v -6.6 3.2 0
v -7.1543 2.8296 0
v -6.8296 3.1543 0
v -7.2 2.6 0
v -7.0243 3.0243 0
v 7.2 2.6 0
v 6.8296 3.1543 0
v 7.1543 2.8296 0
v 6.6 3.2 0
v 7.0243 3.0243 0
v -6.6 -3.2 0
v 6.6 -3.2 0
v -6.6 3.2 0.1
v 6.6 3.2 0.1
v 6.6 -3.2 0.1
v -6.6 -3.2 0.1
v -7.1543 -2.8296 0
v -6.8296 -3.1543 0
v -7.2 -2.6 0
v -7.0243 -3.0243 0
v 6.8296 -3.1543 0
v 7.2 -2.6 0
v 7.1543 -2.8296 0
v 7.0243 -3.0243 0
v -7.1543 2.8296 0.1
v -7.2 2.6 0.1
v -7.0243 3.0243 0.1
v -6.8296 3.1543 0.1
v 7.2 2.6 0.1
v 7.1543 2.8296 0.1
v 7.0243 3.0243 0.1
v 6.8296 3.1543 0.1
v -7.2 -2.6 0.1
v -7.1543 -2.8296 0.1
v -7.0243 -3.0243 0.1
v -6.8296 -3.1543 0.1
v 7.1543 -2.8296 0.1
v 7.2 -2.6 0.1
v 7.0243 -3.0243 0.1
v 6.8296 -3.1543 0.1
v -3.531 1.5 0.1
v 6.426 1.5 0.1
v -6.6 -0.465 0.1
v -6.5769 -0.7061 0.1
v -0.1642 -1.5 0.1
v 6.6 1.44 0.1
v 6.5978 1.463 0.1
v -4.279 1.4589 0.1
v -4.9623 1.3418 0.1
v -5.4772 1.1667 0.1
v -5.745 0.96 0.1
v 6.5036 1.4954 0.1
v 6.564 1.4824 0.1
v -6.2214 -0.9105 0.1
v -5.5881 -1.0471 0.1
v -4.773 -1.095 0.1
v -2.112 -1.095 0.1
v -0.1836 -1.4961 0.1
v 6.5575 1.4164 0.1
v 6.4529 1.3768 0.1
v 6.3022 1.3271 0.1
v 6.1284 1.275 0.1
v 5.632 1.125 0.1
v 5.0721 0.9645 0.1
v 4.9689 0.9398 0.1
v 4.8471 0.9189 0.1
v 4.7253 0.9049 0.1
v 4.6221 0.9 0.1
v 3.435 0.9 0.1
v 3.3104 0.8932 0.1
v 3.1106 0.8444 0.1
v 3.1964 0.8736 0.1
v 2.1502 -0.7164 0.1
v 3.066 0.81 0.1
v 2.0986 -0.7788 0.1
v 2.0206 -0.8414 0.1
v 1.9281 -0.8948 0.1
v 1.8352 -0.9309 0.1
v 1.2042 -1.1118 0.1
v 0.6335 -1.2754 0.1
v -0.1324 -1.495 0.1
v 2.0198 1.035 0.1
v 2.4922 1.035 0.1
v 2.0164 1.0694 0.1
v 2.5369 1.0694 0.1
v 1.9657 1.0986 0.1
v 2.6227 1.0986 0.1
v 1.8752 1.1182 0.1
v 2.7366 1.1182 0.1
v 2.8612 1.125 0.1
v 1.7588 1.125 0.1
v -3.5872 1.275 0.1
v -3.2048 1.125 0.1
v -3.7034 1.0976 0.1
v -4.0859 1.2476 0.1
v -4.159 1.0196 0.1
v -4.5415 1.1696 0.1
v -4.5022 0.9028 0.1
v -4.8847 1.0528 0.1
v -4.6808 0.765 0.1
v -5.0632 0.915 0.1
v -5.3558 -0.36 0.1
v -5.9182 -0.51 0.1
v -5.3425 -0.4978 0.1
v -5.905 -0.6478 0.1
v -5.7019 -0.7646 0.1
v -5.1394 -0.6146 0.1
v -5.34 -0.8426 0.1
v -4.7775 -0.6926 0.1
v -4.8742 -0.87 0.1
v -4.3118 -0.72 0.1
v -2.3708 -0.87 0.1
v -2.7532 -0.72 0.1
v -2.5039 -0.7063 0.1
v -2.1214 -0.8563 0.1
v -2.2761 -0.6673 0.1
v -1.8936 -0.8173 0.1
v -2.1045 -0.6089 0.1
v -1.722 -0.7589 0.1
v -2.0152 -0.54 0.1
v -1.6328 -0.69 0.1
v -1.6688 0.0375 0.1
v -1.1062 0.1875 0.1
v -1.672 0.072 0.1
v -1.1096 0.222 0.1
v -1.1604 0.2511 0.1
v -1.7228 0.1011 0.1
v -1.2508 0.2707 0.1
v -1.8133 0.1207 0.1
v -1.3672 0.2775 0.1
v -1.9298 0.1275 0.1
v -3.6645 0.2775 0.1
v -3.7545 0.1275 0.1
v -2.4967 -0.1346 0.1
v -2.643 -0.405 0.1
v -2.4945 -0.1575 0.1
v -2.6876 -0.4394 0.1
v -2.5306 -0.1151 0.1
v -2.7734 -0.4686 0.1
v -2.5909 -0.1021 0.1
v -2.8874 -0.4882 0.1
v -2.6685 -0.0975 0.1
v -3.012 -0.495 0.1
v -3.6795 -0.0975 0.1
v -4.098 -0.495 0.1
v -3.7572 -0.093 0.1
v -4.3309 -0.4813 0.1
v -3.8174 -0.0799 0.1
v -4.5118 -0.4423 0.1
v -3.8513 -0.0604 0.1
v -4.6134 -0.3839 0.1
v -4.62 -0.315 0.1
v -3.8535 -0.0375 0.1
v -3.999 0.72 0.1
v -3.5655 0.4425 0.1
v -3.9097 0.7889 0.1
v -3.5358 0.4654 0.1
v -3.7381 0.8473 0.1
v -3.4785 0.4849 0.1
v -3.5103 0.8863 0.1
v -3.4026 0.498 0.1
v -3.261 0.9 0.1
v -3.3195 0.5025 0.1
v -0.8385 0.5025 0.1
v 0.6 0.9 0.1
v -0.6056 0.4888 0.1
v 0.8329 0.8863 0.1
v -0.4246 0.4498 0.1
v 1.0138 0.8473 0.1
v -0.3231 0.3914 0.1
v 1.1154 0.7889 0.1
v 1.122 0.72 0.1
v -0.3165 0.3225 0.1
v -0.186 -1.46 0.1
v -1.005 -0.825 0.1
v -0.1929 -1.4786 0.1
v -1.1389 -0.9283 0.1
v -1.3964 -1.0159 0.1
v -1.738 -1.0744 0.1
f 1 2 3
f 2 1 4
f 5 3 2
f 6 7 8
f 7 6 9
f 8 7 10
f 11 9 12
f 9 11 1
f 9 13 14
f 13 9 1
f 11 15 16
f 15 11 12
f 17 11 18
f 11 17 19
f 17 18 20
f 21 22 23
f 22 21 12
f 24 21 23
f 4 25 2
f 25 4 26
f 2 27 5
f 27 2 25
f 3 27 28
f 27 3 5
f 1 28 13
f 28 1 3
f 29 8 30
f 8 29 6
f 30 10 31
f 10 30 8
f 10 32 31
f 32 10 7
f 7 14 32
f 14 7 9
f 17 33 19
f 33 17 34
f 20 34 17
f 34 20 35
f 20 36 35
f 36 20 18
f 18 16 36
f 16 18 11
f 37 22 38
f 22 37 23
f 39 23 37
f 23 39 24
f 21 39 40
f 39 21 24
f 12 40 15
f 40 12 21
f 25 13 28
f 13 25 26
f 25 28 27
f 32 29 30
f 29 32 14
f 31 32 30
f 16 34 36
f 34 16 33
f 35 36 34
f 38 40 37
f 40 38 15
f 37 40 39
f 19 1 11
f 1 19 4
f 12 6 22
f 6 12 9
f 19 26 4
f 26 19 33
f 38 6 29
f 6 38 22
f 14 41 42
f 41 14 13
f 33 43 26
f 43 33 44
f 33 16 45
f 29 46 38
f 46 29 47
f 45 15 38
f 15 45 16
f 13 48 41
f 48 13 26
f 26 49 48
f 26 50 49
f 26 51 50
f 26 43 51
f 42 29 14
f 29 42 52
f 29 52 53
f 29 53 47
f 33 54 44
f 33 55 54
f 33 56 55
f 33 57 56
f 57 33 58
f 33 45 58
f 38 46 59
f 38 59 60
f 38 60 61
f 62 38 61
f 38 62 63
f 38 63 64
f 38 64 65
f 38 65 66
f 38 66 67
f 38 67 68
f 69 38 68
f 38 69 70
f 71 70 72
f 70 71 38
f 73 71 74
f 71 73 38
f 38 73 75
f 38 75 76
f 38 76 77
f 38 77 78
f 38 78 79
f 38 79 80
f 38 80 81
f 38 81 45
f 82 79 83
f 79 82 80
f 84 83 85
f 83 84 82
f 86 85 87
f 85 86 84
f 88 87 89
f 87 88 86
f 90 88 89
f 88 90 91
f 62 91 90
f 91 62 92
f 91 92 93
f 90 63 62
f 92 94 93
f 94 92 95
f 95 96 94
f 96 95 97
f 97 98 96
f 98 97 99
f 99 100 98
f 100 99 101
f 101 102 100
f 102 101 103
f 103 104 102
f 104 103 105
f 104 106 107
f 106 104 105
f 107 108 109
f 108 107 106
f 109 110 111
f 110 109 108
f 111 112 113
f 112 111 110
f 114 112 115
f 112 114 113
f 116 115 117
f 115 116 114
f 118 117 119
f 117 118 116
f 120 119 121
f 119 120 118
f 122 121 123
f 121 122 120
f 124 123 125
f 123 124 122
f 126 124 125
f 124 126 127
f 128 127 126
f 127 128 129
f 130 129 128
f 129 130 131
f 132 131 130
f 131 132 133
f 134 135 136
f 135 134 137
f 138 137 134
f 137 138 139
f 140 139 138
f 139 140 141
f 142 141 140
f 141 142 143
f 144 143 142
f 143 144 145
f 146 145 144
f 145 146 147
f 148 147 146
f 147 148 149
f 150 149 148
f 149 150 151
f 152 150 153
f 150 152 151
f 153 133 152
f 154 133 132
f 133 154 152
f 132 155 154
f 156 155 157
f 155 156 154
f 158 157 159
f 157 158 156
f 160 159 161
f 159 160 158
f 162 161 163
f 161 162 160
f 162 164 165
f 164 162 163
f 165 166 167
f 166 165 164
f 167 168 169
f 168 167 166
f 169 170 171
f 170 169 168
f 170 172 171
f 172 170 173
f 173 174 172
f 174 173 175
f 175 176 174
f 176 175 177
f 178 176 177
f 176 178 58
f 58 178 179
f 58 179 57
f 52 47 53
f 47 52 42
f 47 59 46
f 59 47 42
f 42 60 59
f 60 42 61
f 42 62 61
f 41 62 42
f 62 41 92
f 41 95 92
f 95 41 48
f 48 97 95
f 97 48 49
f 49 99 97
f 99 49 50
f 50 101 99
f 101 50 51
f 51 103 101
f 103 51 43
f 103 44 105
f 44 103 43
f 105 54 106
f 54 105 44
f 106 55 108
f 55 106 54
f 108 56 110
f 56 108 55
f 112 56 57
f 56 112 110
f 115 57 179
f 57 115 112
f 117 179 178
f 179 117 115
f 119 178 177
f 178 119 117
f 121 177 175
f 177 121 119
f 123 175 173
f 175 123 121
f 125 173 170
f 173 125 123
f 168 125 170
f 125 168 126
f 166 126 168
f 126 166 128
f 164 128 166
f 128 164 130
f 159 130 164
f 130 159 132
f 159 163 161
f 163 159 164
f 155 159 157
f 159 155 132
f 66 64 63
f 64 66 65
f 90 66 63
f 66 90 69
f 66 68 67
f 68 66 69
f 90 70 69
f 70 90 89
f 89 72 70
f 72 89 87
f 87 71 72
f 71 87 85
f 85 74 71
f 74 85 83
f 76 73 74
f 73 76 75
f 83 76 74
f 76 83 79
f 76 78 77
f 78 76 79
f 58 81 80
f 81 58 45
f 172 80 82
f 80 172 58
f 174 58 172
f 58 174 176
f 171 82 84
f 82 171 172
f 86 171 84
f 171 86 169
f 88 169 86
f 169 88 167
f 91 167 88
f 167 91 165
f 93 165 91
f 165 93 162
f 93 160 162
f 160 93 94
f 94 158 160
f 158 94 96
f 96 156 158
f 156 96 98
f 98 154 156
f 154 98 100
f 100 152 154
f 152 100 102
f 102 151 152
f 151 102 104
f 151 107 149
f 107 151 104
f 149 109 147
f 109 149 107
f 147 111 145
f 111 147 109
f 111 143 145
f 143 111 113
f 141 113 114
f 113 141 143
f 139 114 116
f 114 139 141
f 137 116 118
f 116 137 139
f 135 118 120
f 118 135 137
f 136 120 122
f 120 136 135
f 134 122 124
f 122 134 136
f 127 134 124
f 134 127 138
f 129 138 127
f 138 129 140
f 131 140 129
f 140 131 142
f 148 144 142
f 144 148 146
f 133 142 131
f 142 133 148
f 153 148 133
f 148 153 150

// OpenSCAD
// file: ../p/box3u12.scad
use <../lib.scad>
function ldraw_lib__box3u12() = [
// 0 Box with 3 Parallel Faces without Any Edges
// 0 Name: box3u12.dat
// 0 Author: J.C. Tchang [tchang]
// 0 !LDRAW_ORG Primitive UPDATE 2014-02
// 0 !LICENSE Licensed under CC BY 4.0 : see CAreadme.txt
// 
// 0 BFC CERTIFY CCW
  [0,"BFC","CERTIFY"],
  [0,"BFC","CCW"],
// 
// 0 !HISTORY 2014-12-23 [PTadmin] Official Update 2014-02
// 
// 
// 4 16 -1 1 1 1 1 1 1 1 -1 -1 1 -1
  [4,16,-1,1,1,1,1,1,1,1,-1,-1,1,-1],
// 4 16 -1 1 1 -1 0 1 1 0 1 1 1 1
  [4,16,-1,1,1,-1,0,1,1,0,1,1,1,1],
// 4 16 1 1 -1 1 0 -1 -1 0 -1 -1 1 -1
  [4,16,1,1,-1,1,0,-1,-1,0,-1,-1,1,-1],
];
module ldraw_lib__box3u12(step=0, col=false, unit=2/5, alt=false, line=0.2, solid=!$preview)
    makepoly(ldraw_lib__box3u12(), step=step, col=col, unit=unit, alt=alt, line=line, solid=solid);
ldraw_lib__box3u12(line=0.2);
// file: ../p/1-4cyli.scad
use <../lib.scad>
function ldraw_lib__1_4cyli() = [
// 0 Cylinder 0.25
// 0 Name: 1-4cyli.dat
// 0 Author: James Jessiman
// 0 !LDRAW_ORG Primitive UPDATE 2012-01
// 0 !LICENSE Licensed under CC BY 4.0 : see CAreadme.txt
// 
// 0 BFC CERTIFY CCW
  [0,"BFC","CERTIFY"],
  [0,"BFC","CCW"],
// 
// 0 !HISTORY 2002-03-23 [sbliss] Added BFC statement.
// 0 !HISTORY 2002-04-25 [PTadmin] Official Update 2002-02
// 0 !HISTORY 2007-06-22 [PTadmin] Header formatted for Contributor Agreement
// 0 !HISTORY 2008-07-01 [PTadmin] Official Update 2008-01
// 0 !HISTORY 2012-02-16 [Philo] Changed to CCW
// 0 !HISTORY 2012-03-30 [PTadmin] Official Update 2012-01
// 
// 
// 4 16 1 1 0 0.9239 1 0.3827 0.9239 0 0.3827 1 0 0
  [4,16,1,1,0,0.9239,1,0.3827,0.9239,0,0.3827,1,0,0],
// 5 24 1 0 0 1 1 0 0.9239 0 0.3827 1 0 -1
  [5,24,1,0,0,1,1,0,0.9239,0,0.3827,1,0,-1],
// 4 16 0.9239 1 0.3827 0.7071 1 0.7071 0.7071 0 0.7071 0.9239 0 0.3827
  [4,16,0.9239,1,0.3827,0.7071,1,0.7071,0.7071,0,0.7071,0.9239,0,0.3827],
// 5 24 0.9239 0 0.3827 0.9239 1 0.3827 0.7071 0 0.7071 1 0 0
  [5,24,0.9239,0,0.3827,0.9239,1,0.3827,0.7071,0,0.7071,1,0,0],
// 4 16 0.7071 1 0.7071 0.3827 1 0.9239 0.3827 0 0.9239 0.7071 0 0.7071
  [4,16,0.7071,1,0.7071,0.3827,1,0.9239,0.3827,0,0.9239,0.7071,0,0.7071],
// 5 24 0.7071 0 0.7071 0.7071 1 0.7071 0.3827 0 0.9239 0.9239 0 0.3827
  [5,24,0.7071,0,0.7071,0.7071,1,0.7071,0.3827,0,0.9239,0.9239,0,0.3827],
// 4 16 0.3827 1 0.9239 0 1 1 0 0 1 0.3827 0 0.9239
  [4,16,0.3827,1,0.9239,0,1,1,0,0,1,0.3827,0,0.9239],
// 5 24 0.3827 0 0.9239 0.3827 1 0.9239 0 0 1 0.7071 0 0.7071
  [5,24,0.3827,0,0.9239,0.3827,1,0.9239,0,0,1,0.7071,0,0.7071],
// 5 24 0 0 1 0 1 1 0.3827 0 0.9239 -1 0 1
  [5,24,0,0,1,0,1,1,0.3827,0,0.9239,-1,0,1],
];
module ldraw_lib__1_4cyli(step=0, col=false, unit=2/5, alt=false, line=0.2, solid=!$preview)
    makepoly(ldraw_lib__1_4cyli(), step=step, col=col, unit=unit, alt=alt, line=line, solid=solid);
ldraw_lib__1_4cyli(line=0.2);
// file: ../p/1-4chrd.scad
use <../lib.scad>
function ldraw_lib__1_4chrd() = [
// 0 Chord 0.25
// 0 Name: 1-4chrd.dat
// 0 Author: Max Martin Richter [MMR1988]
// 0 !LDRAW_ORG Primitive UPDATE 2023-05
// 0 !LICENSE Licensed under CC BY 4.0 : see CAreadme.txt
// 
// 0 BFC CERTIFY CCW
  [0,"BFC","CERTIFY"],
  [0,"BFC","CCW"],
// 
// 0 !HISTORY 2004-04-22 [PTadmin] Official Update 2004-02
// 0 !HISTORY 2007-10-09 [PTadmin] Header formatted for Contributor Agreement
// 0 !HISTORY 2008-07-01 [PTadmin] Official Update 2008-01
// 0 !HISTORY 2012-08-02 [MMR1988] Re-creation with PrimGen2 and Rectifier
// 0 !HISTORY 2012-08-09 [PTadmin] Official Update 2012-02
// 0 !HISTORY 2023-10-27 [OrionP] Change author to MMR1988 from hafhead
// 0 !HISTORY 2023-10-31 [OrionP] Official Update 2023-05
// 
// 4 16 0.9239 0 0.3827 0.3827 0 0.9239 0 0 1 1 0 0
  [4,16,0.9239,0,0.3827,0.3827,0,0.9239,0,0,1,1,0,0],
// 3 16 0.7071 0 0.7071 0.3827 0 0.9239 0.9239 0 0.3827
  [3,16,0.7071,0,0.7071,0.3827,0,0.9239,0.9239,0,0.3827],
];
module ldraw_lib__1_4chrd(step=0, col=false, unit=2/5, alt=false, line=0.2, solid=!$preview)
    makepoly(ldraw_lib__1_4chrd(), step=step, col=col, unit=unit, alt=alt, line=line, solid=solid);
ldraw_lib__1_4chrd(line=0.2);
// main file
use <../lib.scad>
use <../p/1-4chrd.scad>
use <../p/1-4cyli.scad>
use <../p/box3u12.scad>
function ldraw_lib__6177969s() = [
// 0 Sticker  0.8 x  1.8 with White GT Logo on Red Background
// 0 Name: 6177969s.dat
// 0 Author: Massimo Maso [Sirio]
// 0 !LDRAW_ORG Part UPDATE 2024-01
// 0 !LICENSE Licensed under CC BY 4.0 : see CAreadme.txt
// 
// 0 BFC CERTIFY CCW
  [0,"BFC","CERTIFY"],
  [0,"BFC","CCW"],
// 
// 0 !KEYWORDS 2016, Bricklink 75881stk01, Brickowl 507382, Ford, GT
// 0 !KEYWORDS Rebrickable 30897, Set 75881, Speed Champions
// 
// 0 !HISTORY 2024-01-29 [OrionP] Official Update 2024-01
// 
// 
// 0 // Primitives
// 1 16 -16.5 0 6.5 -1.5 0 0 0 -1 0 0 0 1.5 1-4chrd.dat
  [1,16,-16.5,0,6.5,-1.5,0,0,0,-1,0,0,0,1.5, ldraw_lib__1_4chrd()],
// 1 16 16.5 0 6.5 1.5 0 0 0 -1 0 0 0 1.5 1-4chrd.dat
  [1,16,16.5,0,6.5,1.5,0,0,0,-1,0,0,0,1.5, ldraw_lib__1_4chrd()],
// 1 16 0 -.25 0 16.5 0 0 0 .25 0 0 0 8 box3u12.dat
  [1,16,0,-.25,0,16.5,0,0,0,.25,0,0,0,8, ldraw_lib__box3u12()],
// 1 16 -16.5 0 -6.5 -1.5 0 0 0 -1 0 0 0 -1.5 1-4chrd.dat
  [1,16,-16.5,0,-6.5,-1.5,0,0,0,-1,0,0,0,-1.5, ldraw_lib__1_4chrd()],
// 1 16 16.5 0 -6.5 1.5 0 0 0 -1 0 0 0 -1.5 1-4chrd.dat
  [1,16,16.5,0,-6.5,1.5,0,0,0,-1,0,0,0,-1.5, ldraw_lib__1_4chrd()],
// 1 16 -16.5 0 6.5 -1.5 0 0 0 -.25 0 0 0 1.5 1-4cyli.dat
  [1,16,-16.5,0,6.5,-1.5,0,0,0,-.25,0,0,0,1.5, ldraw_lib__1_4cyli()],
// 1 16 16.5 0 6.5 1.5 0 0 0 -.25 0 0 0 1.5 1-4cyli.dat
  [1,16,16.5,0,6.5,1.5,0,0,0,-.25,0,0,0,1.5, ldraw_lib__1_4cyli()],
// 1 16 -16.5 0 -6.5 -1.5 0 0 0 -.25 0 0 0 -1.5 1-4cyli.dat
  [1,16,-16.5,0,-6.5,-1.5,0,0,0,-.25,0,0,0,-1.5, ldraw_lib__1_4cyli()],
// 1 16 16.5 0 -6.5 1.5 0 0 0 -.25 0 0 0 -1.5 1-4cyli.dat
  [1,16,16.5,0,-6.5,1.5,0,0,0,-.25,0,0,0,-1.5, ldraw_lib__1_4cyli()],
// 1 4 -16.5 -.25 6.5 -1.5 0 0 0 1 0 0 0 1.5 1-4chrd.dat
  [1,4,-16.5,-.25,6.5,-1.5,0,0,0,1,0,0,0,1.5, ldraw_lib__1_4chrd()],
// 1 4 16.5 -.25 6.5 1.5 0 0 0 1 0 0 0 1.5 1-4chrd.dat
  [1,4,16.5,-.25,6.5,1.5,0,0,0,1,0,0,0,1.5, ldraw_lib__1_4chrd()],
// 1 4 -16.5 -.25 -6.5 -1.5 0 0 0 1 0 0 0 -1.5 1-4chrd.dat
  [1,4,-16.5,-.25,-6.5,-1.5,0,0,0,1,0,0,0,-1.5, ldraw_lib__1_4chrd()],
// 1 4 16.5 -.25 -6.5 1.5 0 0 0 1 0 0 0 -1.5 1-4chrd.dat
  [1,4,16.5,-.25,-6.5,1.5,0,0,0,1,0,0,0,-1.5, ldraw_lib__1_4chrd()],
// 0 // Bottom face
// 4 16 -16.5 0 8 -16.5 0 -8 -18 0 -6.5 -18 0 6.5
  [4,16,-16.5,0,8,-16.5,0,-8,-18,0,-6.5,-18,0,6.5],
// 4 16 16.5 0 8 18 0 6.5 18 0 -6.5 16.5 0 -8
  [4,16,16.5,0,8,18,0,6.5,18,0,-6.5,16.5,0,-8],
// 0 // Lateral face
// 4 16 -18 0 6.5 -18 0 -6.5 -18 -.25 -6.5 -18 -.25 6.5
  [4,16,-18,0,6.5,-18,0,-6.5,-18,-.25,-6.5,-18,-.25,6.5],
// 4 16 18 0 6.5 18 -.25 6.5 18 -.25 -6.5 18 0 -6.5
  [4,16,18,0,6.5,18,-.25,6.5,18,-.25,-6.5,18,0,-6.5],
// 0 // Top face
// 0 // Red faces
// 4 4 -16.5 -.25 8 -8.8275 -.25 3.75 16.065 -.25 3.75 16.5 -.25 8
  [4,4,-16.5,-.25,8,-8.8275,-.25,3.75,16.065,-.25,3.75,16.5,-.25,8],
// 4 4 -16.4422 -.25 -1.7653 -16.5 -.25 -1.1625 -18 -.25 6.5 -18 -.25 -6.5
  [4,4,-16.4422,-.25,-1.7653,-16.5,-.25,-1.1625,-18,-.25,6.5,-18,-.25,-6.5],
// 3 4 -18 -.25 -6.5 -16.5 -.25 -8 -.41055 -.25 -3.75
  [3,4,-18,-.25,-6.5,-16.5,-.25,-8,-.41055,-.25,-3.75],
// 4 4 16.4945 -.25 3.6574 16.5 -.25 3.6 18 -.25 -6.5 18 -.25 6.5
  [4,4,16.4945,-.25,3.6574,16.5,-.25,3.6,18,-.25,-6.5,18,-.25,6.5],
// 4 4 16.5 -.25 -8 18 -.25 -6.5 -.41055 -.25 -3.75 -16.5 -.25 -8
  [4,4,16.5,-.25,-8,18,-.25,-6.5,-.41055,-.25,-3.75,-16.5,-.25,-8],
// 4 4 -16.5 -.25 8 -18 -.25 6.5 -10.6974 -.25 3.6473 -8.8275 -.25 3.75
  [4,4,-16.5,-.25,8,-18,-.25,6.5,-10.6974,-.25,3.6473,-8.8275,-.25,3.75],
// 3 4 -18 -.25 6.5 -12.4058 -.25 3.3546 -10.6974 -.25 3.6473
  [3,4,-18,-.25,6.5,-12.4058,-.25,3.3546,-10.6974,-.25,3.6473],
// 3 4 -18 -.25 6.5 -13.693 -.25 2.9167 -12.4058 -.25 3.3546
  [3,4,-18,-.25,6.5,-13.693,-.25,2.9167,-12.4058,-.25,3.3546],
// 3 4 -18 -.25 6.5 -14.3625 -.25 2.4 -13.693 -.25 2.9167
  [3,4,-18,-.25,6.5,-14.3625,-.25,2.4,-13.693,-.25,2.9167],
// 3 4 -18 -.25 6.5 -16.5 -.25 -1.1625 -14.3625 -.25 2.4
  [3,4,-18,-.25,6.5,-16.5,-.25,-1.1625,-14.3625,-.25,2.4],
// 4 4 16.5 -.25 8 16.065 -.25 3.75 16.2591 -.25 3.7386 18 -.25 6.5
  [4,4,16.5,-.25,8,16.065,-.25,3.75,16.2591,-.25,3.7386,18,-.25,6.5],
// 3 4 18 -.25 6.5 16.2591 -.25 3.7386 16.4099 -.25 3.7061
  [3,4,18,-.25,6.5,16.2591,-.25,3.7386,16.4099,-.25,3.7061],
// 3 4 18 -.25 6.5 16.4099 -.25 3.7061 16.4945 -.25 3.6574
  [3,4,18,-.25,6.5,16.4099,-.25,3.7061,16.4945,-.25,3.6574],
// 3 4 -18 -.25 -6.5 -15.5536 -.25 -2.2762 -16.4422 -.25 -1.7653
  [3,4,-18,-.25,-6.5,-15.5536,-.25,-2.2762,-16.4422,-.25,-1.7653],
// 3 4 -18 -.25 -6.5 -13.9703 -.25 -2.6177 -15.5536 -.25 -2.2762
  [3,4,-18,-.25,-6.5,-13.9703,-.25,-2.6177,-15.5536,-.25,-2.2762],
// 3 4 -18 -.25 -6.5 -11.9325 -.25 -2.7375 -13.9703 -.25 -2.6177
  [3,4,-18,-.25,-6.5,-11.9325,-.25,-2.7375,-13.9703,-.25,-2.6177],
// 4 4 -18 -.25 -6.5 -.4591 -.25 -3.7403 -5.28 -.25 -2.7375 -11.9325 -.25 -2.7375
  [4,4,-18,-.25,-6.5,-.4591,-.25,-3.7403,-5.28,-.25,-2.7375,-11.9325,-.25,-2.7375],
// 3 4 -18 -.25 -6.5 -.4106 -.25 -3.75 -.4591 -.25 -3.7403
  [3,4,-18,-.25,-6.5,-.4106,-.25,-3.75,-.4591,-.25,-3.7403],
// 3 4 18 -.25 -6.5 16.5 -.25 3.6 16.3937 -.25 3.5411
  [3,4,18,-.25,-6.5,16.5,-.25,3.6,16.3937,-.25,3.5411],
// 3 4 18 -.25 -6.5 16.3937 -.25 3.5411 16.1323 -.25 3.4419
  [3,4,18,-.25,-6.5,16.3937,-.25,3.5411,16.1323,-.25,3.4419],
// 3 4 18 -.25 -6.5 16.1323 -.25 3.4419 15.7556 -.25 3.3178
  [3,4,18,-.25,-6.5,16.1323,-.25,3.4419,15.7556,-.25,3.3178],
// 4 4 14.08 -.25 2.8125 18 -.25 -6.5 15.7556 -.25 3.3178 15.321 -.25 3.1875
  [4,4,14.08,-.25,2.8125,18,-.25,-6.5,15.7556,-.25,3.3178,15.321,-.25,3.1875],
// 3 4 18 -.25 -6.5 14.08 -.25 2.8125 12.6803 -.25 2.4113
  [3,4,18,-.25,-6.5,14.08,-.25,2.8125,12.6803,-.25,2.4113],
// 3 4 18 -.25 -6.5 12.6803 -.25 2.4113 12.4222 -.25 2.3495
  [3,4,18,-.25,-6.5,12.6803,-.25,2.4113,12.4222,-.25,2.3495],
// 3 4 18 -.25 -6.5 12.4222 -.25 2.3495 12.1178 -.25 2.2973
  [3,4,18,-.25,-6.5,12.4222,-.25,2.3495,12.1178,-.25,2.2973],
// 3 4 18 -.25 -6.5 12.1178 -.25 2.2973 11.8133 -.25 2.2623
  [3,4,18,-.25,-6.5,12.1178,-.25,2.2973,11.8133,-.25,2.2623],
// 3 4 18 -.25 -6.5 11.8133 -.25 2.2623 11.5553 -.25 2.25
  [3,4,18,-.25,-6.5,11.8133,-.25,2.2623,11.5553,-.25,2.25],
// 4 4 18 -.25 -6.5 11.5553 -.25 2.25 8.5875 -.25 2.25 8.2759 -.25 2.2329
  [4,4,18,-.25,-6.5,11.5553,-.25,2.25,8.5875,-.25,2.25,8.2759,-.25,2.2329],
// 4 4 18 -.25 -6.5 8.2759 -.25 2.2329 7.9911 -.25 2.1841 7.7766 -.25 2.1111
  [4,4,18,-.25,-6.5,8.2759,-.25,2.2329,7.9911,-.25,2.1841,7.7766,-.25,2.1111],
// 4 4 18 -.25 -6.5 7.7766 -.25 2.1111 7.665 -.25 2.025 5.3754 -.25 -1.7911
  [4,4,18,-.25,-6.5,7.7766,-.25,2.1111,7.665,-.25,2.025,5.3754,-.25,-1.7911],
// 3 4 18 -.25 -6.5 5.3754 -.25 -1.7911 5.2465 -.25 -1.9469
  [3,4,18,-.25,-6.5,5.3754,-.25,-1.7911,5.2465,-.25,-1.9469],
// 3 4 18 -.25 -6.5 5.2465 -.25 -1.9469 5.0516 -.25 -2.1035
  [3,4,18,-.25,-6.5,5.2465,-.25,-1.9469,5.0516,-.25,-2.1035],
// 3 4 18 -.25 -6.5 5.0516 -.25 -2.1035 4.8203 -.25 -2.2371
  [3,4,18,-.25,-6.5,5.0516,-.25,-2.1035,4.8203,-.25,-2.2371],
// 3 4 18 -.25 -6.5 4.8203 -.25 -2.2371 4.5879 -.25 -2.3273
  [3,4,18,-.25,-6.5,4.8203,-.25,-2.2371,4.5879,-.25,-2.3273],
// 3 4 18 -.25 -6.5 4.5879 -.25 -2.3273 3.0104 -.25 -2.7795
  [3,4,18,-.25,-6.5,4.5879,-.25,-2.3273,3.0104,-.25,-2.7795],
// 3 4 18 -.25 -6.5 3.0104 -.25 -2.7795 1.5838 -.25 -3.1885
  [3,4,18,-.25,-6.5,3.0104,-.25,-2.7795,1.5838,-.25,-3.1885],
// 3 4 18 -.25 -6.5 1.5838 -.25 -3.1885 -.3311 -.25 -3.7374
  [3,4,18,-.25,-6.5,1.5838,-.25,-3.1885,-.3311,-.25,-3.7374],
// 3 4 18 -.25 -6.5 -.3311 -.25 -3.7374 -.4106 -.25 -3.75
  [3,4,18,-.25,-6.5,-.3311,-.25,-3.7374,-.4106,-.25,-3.75],
// 4 4 5.0494 -.25 2.5875 1.5838 -.25 -3.1885 3.0104 -.25 -2.7795 6.2306 -.25 2.5875
  [4,4,5.0494,-.25,2.5875,1.5838,-.25,-3.1885,3.0104,-.25,-2.7795,6.2306,-.25,2.5875],
// 4 4 5.0494 -.25 2.5875 6.2306 -.25 2.5875 6.3422 -.25 2.6736 5.0411 -.25 2.6736
  [4,4,5.0494,-.25,2.5875,6.2306,-.25,2.5875,6.3422,-.25,2.6736,5.0411,-.25,2.6736],
// 4 4 4.9142 -.25 2.7466 5.0411 -.25 2.6736 6.3422 -.25 2.6736 6.5567 -.25 2.7466
  [4,4,4.9142,-.25,2.7466,5.0411,-.25,2.6736,6.3422,-.25,2.6736,6.5567,-.25,2.7466],
// 4 4 4.9142 -.25 2.7466 6.5567 -.25 2.7466 6.8415 -.25 2.7954 4.688 -.25 2.7954
  [4,4,4.9142,-.25,2.7466,6.5567,-.25,2.7466,6.8415,-.25,2.7954,4.688,-.25,2.7954],
// 4 4 4.3969 -.25 2.8125 4.688 -.25 2.7954 6.8415 -.25 2.7954 7.1531 -.25 2.8125
  [4,4,4.3969,-.25,2.8125,4.688,-.25,2.7954,6.8415,-.25,2.7954,7.1531,-.25,2.8125],
// 4 4 4.3969 -.25 2.8125 7.1531 -.25 2.8125 15.321 -.25 3.1875 -8.9681 -.25 3.1875
  [4,4,4.3969,-.25,2.8125,7.1531,-.25,2.8125,15.321,-.25,3.1875,-8.9681,-.25,3.1875],
// 3 4 4.3969 -.25 2.8125 -8.9681 -.25 3.1875 -8.0119 -.25 2.8125
  [3,4,4.3969,-.25,2.8125,-8.9681,-.25,3.1875,-8.0119,-.25,2.8125],
// 3 4 7.1531 -.25 2.8125 14.08 -.25 2.8125 15.321 -.25 3.1875
  [3,4,7.1531,-.25,2.8125,14.08,-.25,2.8125,15.321,-.25,3.1875],
// 4 4 -9.2585 -.25 2.744 -8.0119 -.25 2.8125 -8.9681 -.25 3.1875 -10.2147 -.25 3.119
  [4,4,-9.2585,-.25,2.744,-8.0119,-.25,2.8125,-8.9681,-.25,3.1875,-10.2147,-.25,3.119],
// 4 4 -9.2585 -.25 2.744 -10.2147 -.25 3.119 -11.3537 -.25 2.9239 -10.3974 -.25 2.5489
  [4,4,-9.2585,-.25,2.744,-10.2147,-.25,3.119,-11.3537,-.25,2.9239,-10.3974,-.25,2.5489],
// 4 4 -11.2555 -.25 2.2569 -10.3974 -.25 2.5489 -11.3537 -.25 2.9239 -12.2117 -.25 2.6319
  [4,4,-11.2555,-.25,2.2569,-10.3974,-.25,2.5489,-11.3537,-.25,2.9239,-12.2117,-.25,2.6319],
// 4 4 -11.2555 -.25 2.2569 -12.2117 -.25 2.6319 -12.6581 -.25 2.2875 -11.7019 -.25 1.9125
  [4,4,-11.2555,-.25,2.2569,-12.2117,-.25,2.6319,-12.6581,-.25,2.2875,-11.7019,-.25,1.9125],
// 4 4 -13.3894 -.25 -.9 -11.7019 -.25 1.9125 -12.6581 -.25 2.2875 -14.7956 -.25 -1.275
  [4,4,-13.3894,-.25,-.9,-11.7019,-.25,1.9125,-12.6581,-.25,2.2875,-14.7956,-.25,-1.275],
// 4 4 -13.3894 -.25 -.9 -14.7956 -.25 -1.275 -14.7626 -.25 -1.6194 -13.3563 -.25 -1.2444
  [4,4,-13.3894,-.25,-.9,-14.7956,-.25,-1.275,-14.7626,-.25,-1.6194,-13.3563,-.25,-1.2444],
// 4 4 -12.8486 -.25 -1.5364 -13.3563 -.25 -1.2444 -14.7626 -.25 -1.6194 -14.2548 -.25 -1.9114
  [4,4,-12.8486,-.25,-1.5364,-13.3563,-.25,-1.2444,-14.7626,-.25,-1.6194,-14.2548,-.25,-1.9114],
// 4 4 -12.8486 -.25 -1.5364 -14.2548 -.25 -1.9114 -13.35 -.25 -2.1065 -11.9438 -.25 -1.7315
  [4,4,-12.8486,-.25,-1.5364,-14.2548,-.25,-1.9114,-13.35,-.25,-2.1065,-11.9438,-.25,-1.7315],
// 4 4 -10.7794 -.25 -1.8 -11.9438 -.25 -1.7315 -13.35 -.25 -2.1065 -12.1856 -.25 -2.175
  [4,4,-10.7794,-.25,-1.8,-11.9438,-.25,-1.7315,-13.35,-.25,-2.1065,-12.1856,-.25,-2.175],
// 4 4 -10.7794 -.25 -1.8 -12.1856 -.25 -2.175 -5.9269 -.25 -2.175 -6.8831 -.25 -1.8
  [4,4,-10.7794,-.25,-1.8,-12.1856,-.25,-2.175,-5.9269,-.25,-2.175,-6.8831,-.25,-1.8],
// 4 4 -6.2598 -.25 -1.7657 -6.8831 -.25 -1.8 -5.9269 -.25 -2.175 -5.3036 -.25 -2.1407
  [4,4,-6.2598,-.25,-1.7657,-6.8831,-.25,-1.8,-5.9269,-.25,-2.175,-5.3036,-.25,-2.1407],
// 4 4 -6.2598 -.25 -1.7657 -5.3036 -.25 -2.1407 -4.7341 -.25 -2.0432 -5.6903 -.25 -1.6682
  [4,4,-6.2598,-.25,-1.7657,-5.3036,-.25,-2.1407,-4.7341,-.25,-2.0432,-5.6903,-.25,-1.6682],
// 4 4 -5.2613 -.25 -1.5222 -5.6903 -.25 -1.6682 -4.7341 -.25 -2.0432 -4.3051 -.25 -1.8972
  [4,4,-5.2613,-.25,-1.5222,-5.6903,-.25,-1.6682,-4.7341,-.25,-2.0432,-4.3051,-.25,-1.8972],
// 4 4 -5.2613 -.25 -1.5222 -4.3051 -.25 -1.8972 -4.0819 -.25 -1.725 -5.0381 -.25 -1.35
  [4,4,-5.2613,-.25,-1.5222,-4.3051,-.25,-1.8972,-4.0819,-.25,-1.725,-5.0381,-.25,-1.35],
// 4 4 -4.1719 -.25 .0938 -5.0381 -.25 -1.35 -4.0819 -.25 -1.725 -2.7656 -.25 .4688
  [4,4,-4.1719,-.25,.0938,-5.0381,-.25,-1.35,-4.0819,-.25,-1.725,-2.7656,-.25,.4688],
// 4 4 -4.1719 -.25 .0938 -2.7656 -.25 .4688 -2.7739 -.25 .5549 -4.1801 -.25 .1799
  [4,4,-4.1719,-.25,.0938,-2.7656,-.25,.4688,-2.7739,-.25,.5549,-4.1801,-.25,.1799],
// 4 4 -4.3071 -.25 .2528 -4.1801 -.25 .1799 -2.7739 -.25 .5549 -2.9009 -.25 .6278
  [4,4,-4.3071,-.25,.2528,-4.1801,-.25,.1799,-2.7739,-.25,.5549,-2.9009,-.25,.6278],
// 4 4 -4.3071 -.25 .2528 -2.9009 -.25 .6278 -3.1271 -.25 .6767 -4.5333 -.25 .3017
  [4,4,-4.3071,-.25,.2528,-2.9009,-.25,.6278,-3.1271,-.25,.6767,-4.5333,-.25,.3017],
// 4 4 -4.8244 -.25 .3188 -4.5333 -.25 .3017 -3.1271 -.25 .6767 -3.4181 -.25 .6938
  [4,4,-4.8244,-.25,.3188,-4.5333,-.25,.3017,-3.1271,-.25,.6767,-3.4181,-.25,.6938],
// 4 4 -4.8244 -.25 .3188 -3.4181 -.25 .6938 -9.1613 -.25 .6938 -9.3863 -.25 .3188
  [4,4,-4.8244,-.25,.3188,-3.4181,-.25,.6938,-9.1613,-.25,.6938,-9.3863,-.25,.3188],
// 4 4 -6.2417 -.25 -.3364 -6.7191 -.25 -1.0986 -6.6075 -.25 -1.0125 -6.2363 -.25 -.3938
  [4,4,-6.2417,-.25,-.3364,-6.7191,-.25,-1.0986,-6.6075,-.25,-1.0125,-6.2363,-.25,-.3938],
// 4 4 -6.2417 -.25 -.3364 -6.3264 -.25 -.2877 -6.9336 -.25 -1.1716 -6.7191 -.25 -1.0986
  [4,4,-6.2417,-.25,-.3364,-6.3264,-.25,-.2877,-6.9336,-.25,-1.1716,-6.7191,-.25,-1.0986],
// 4 4 -6.4772 -.25 -.2552 -7.2184 -.25 -1.2204 -6.9336 -.25 -1.1716 -6.3264 -.25 -.2877
  [4,4,-6.4772,-.25,-.2552,-7.2184,-.25,-1.2204,-6.9336,-.25,-1.1716,-6.3264,-.25,-.2877],
// 4 4 -6.4772 -.25 -.2552 -6.6713 -.25 -.2438 -7.53 -.25 -1.2375 -7.2184 -.25 -1.2204
  [4,4,-6.4772,-.25,-.2552,-6.6713,-.25,-.2438,-7.53,-.25,-1.2375,-7.2184,-.25,-1.2204],
// 4 4 -9.1988 -.25 -.2438 -10.245 -.25 -1.2375 -7.53 -.25 -1.2375 -6.6713 -.25 -.2438
  [4,4,-9.1988,-.25,-.2438,-10.245,-.25,-1.2375,-7.53,-.25,-1.2375,-6.6713,-.25,-.2438],
// 4 4 -9.1988 -.25 -.2438 -9.3929 -.25 -.2324 -10.8272 -.25 -1.2032 -10.245 -.25 -1.2375
  [4,4,-9.1988,-.25,-.2438,-9.3929,-.25,-.2324,-10.8272,-.25,-1.2032,-10.245,-.25,-1.2375],
// 4 4 -9.5436 -.25 -.1998 -11.2796 -.25 -1.1057 -10.8272 -.25 -1.2032 -9.3929 -.25 -.2324
  [4,4,-9.5436,-.25,-.1998,-11.2796,-.25,-1.1057,-10.8272,-.25,-1.2032,-9.3929,-.25,-.2324],
// 4 4 -9.5436 -.25 -.1998 -9.6283 -.25 -.1511 -11.5335 -.25 -.9597 -11.2796 -.25 -1.1057
  [4,4,-9.5436,-.25,-.1998,-9.6283,-.25,-.1511,-11.5335,-.25,-.9597,-11.2796,-.25,-1.1057],
// 4 4 -9.6338 -.25 -.0938 -11.55 -.25 -.7875 -11.5335 -.25 -.9597 -9.6283 -.25 -.1511
  [4,4,-9.6338,-.25,-.0938,-11.55,-.25,-.7875,-11.5335,-.25,-.9597,-9.6283,-.25,-.1511],
// 3 4 -9.6338 -.25 -.0938 -9.3863 -.25 .3188 -11.55 -.25 -.7875
  [3,4,-9.6338,-.25,-.0938,-9.3863,-.25,.3188,-11.55,-.25,-.7875],
// 4 4 -9.1613 -.25 .6938 -9.9975 -.25 1.8 -11.55 -.25 -.7875 -9.3863 -.25 .3188
  [4,4,-9.1613,-.25,.6938,-9.9975,-.25,1.8,-11.55,-.25,-.7875,-9.3863,-.25,.3188],
// 3 4 -9.1613 -.25 .6938 -8.9138 -.25 1.1063 -9.9975 -.25 1.8
  [3,4,-9.1613,-.25,.6938,-8.9138,-.25,1.1063,-9.9975,-.25,1.8],
// 4 4 -8.8394 -.25 1.1636 -9.7743 -.25 1.9722 -9.9975 -.25 1.8 -8.9138 -.25 1.1063
  [4,4,-8.8394,-.25,1.1636,-9.7743,-.25,1.9722,-9.9975,-.25,1.8,-8.9138,-.25,1.1063],
// 4 4 -8.8394 -.25 1.1636 -8.6963 -.25 1.2123 -9.3453 -.25 2.1182 -9.7743 -.25 1.9722
  [4,4,-8.8394,-.25,1.1636,-8.6963,-.25,1.2123,-9.3453,-.25,2.1182,-9.7743,-.25,1.9722],
// 4 4 -8.5065 -.25 1.2449 -8.7758 -.25 2.2157 -9.3453 -.25 2.1182 -8.6963 -.25 1.2123
  [4,4,-8.5065,-.25,1.2449,-8.7758,-.25,2.2157,-9.3453,-.25,2.1182,-8.6963,-.25,1.2123],
// 4 4 -8.5065 -.25 1.2449 -8.2988 -.25 1.2563 -8.1525 -.25 2.25 -8.7758 -.25 2.2157
  [4,4,-8.5065,-.25,1.2449,-8.2988,-.25,1.2563,-8.1525,-.25,2.25,-8.7758,-.25,2.2157],
// 4 4 -2.0963 -.25 1.2563 1.5 -.25 2.25 -8.1525 -.25 2.25 -8.2988 -.25 1.2563
  [4,4,-2.0963,-.25,1.2563,1.5,-.25,2.25,-8.1525,-.25,2.25,-8.2988,-.25,1.2563],
// 4 4 -2.0963 -.25 1.2563 -1.514 -.25 1.222 2.0822 -.25 2.2157 1.5 -.25 2.25
  [4,4,-2.0963,-.25,1.2563,-1.514,-.25,1.222,2.0822,-.25,2.2157,1.5,-.25,2.25],
// 4 4 -1.0616 -.25 1.1245 2.5346 -.25 2.1182 2.0822 -.25 2.2157 -1.514 -.25 1.222
  [4,4,-1.0616,-.25,1.1245,2.5346,-.25,2.1182,2.0822,-.25,2.2157,-1.514,-.25,1.222],
// 4 4 -1.0616 -.25 1.1245 -.8078 -.25 .9785 2.7885 -.25 1.9722 2.5346 -.25 2.1182
  [4,4,-1.0616,-.25,1.1245,-.8078,-.25,.9785,2.7885,-.25,1.9722,2.5346,-.25,2.1182],
// 4 4 -.7913 -.25 .8063 2.805 -.25 1.8 2.7885 -.25 1.9722 -.8078 -.25 .9785
  [4,4,-.7913,-.25,.8063,2.805,-.25,1.8,2.7885,-.25,1.9722,-.8078,-.25,.9785],
// 4 4 -.7913 -.25 .8063 -2.5125 -.25 -2.0625 -.4651 -.25 -3.6501 2.805 -.25 1.8
  [4,4,-.7913,-.25,.8063,-2.5125,-.25,-2.0625,-.4651,-.25,-3.6501,2.805,-.25,1.8],
// 4 4 -2.8473 -.25 -2.3208 -.4823 -.25 -3.6965 -.4651 -.25 -3.6501 -2.5125 -.25 -2.0625
  [4,4,-2.8473,-.25,-2.3208,-.4823,-.25,-3.6965,-.4651,-.25,-3.6501,-2.5125,-.25,-2.0625],
// 4 4 -2.8473 -.25 -2.3208 -3.4909 -.25 -2.5398 -.4591 -.25 -3.7403 -.4823 -.25 -3.6965
  [4,4,-2.8473,-.25,-2.3208,-3.4909,-.25,-2.5398,-.4591,-.25,-3.7403,-.4823,-.25,-3.6965],
// 3 4 -.4591 -.25 -3.7403 -3.4909 -.25 -2.5398 -4.3451 -.25 -2.6861
  [3,4,-.4591,-.25,-3.7403,-3.4909,-.25,-2.5398,-4.3451,-.25,-2.6861],
// 3 4 -.4591 -.25 -3.7403 -4.3451 -.25 -2.6861 -5.28 -.25 -2.7375
  [3,4,-.4591,-.25,-3.7403,-4.3451,-.25,-2.6861,-5.28,-.25,-2.7375],
// 0 // White faces
// 4 15 16.065 -.25 3.75 16.4945 -.25 3.6574 16.4099 -.25 3.7061 16.2591 -.25 3.7386
  [4,15,16.065,-.25,3.75,16.4945,-.25,3.6574,16.4099,-.25,3.7061,16.2591,-.25,3.7386],
// 4 15 16.065 -.25 3.75 16.3937 -.25 3.5411 16.5 -.25 3.6 16.4945 -.25 3.6574
  [4,15,16.065,-.25,3.75,16.3937,-.25,3.5411,16.5,-.25,3.6,16.4945,-.25,3.6574],
// 4 15 16.065 -.25 3.75 15.7556 -.25 3.3178 16.1323 -.25 3.4419 16.3937 -.25 3.5411
  [4,15,16.065,-.25,3.75,15.7556,-.25,3.3178,16.1323,-.25,3.4419,16.3937,-.25,3.5411],
// 3 15 16.065 -.25 3.75 15.321 -.25 3.1875 15.7556 -.25 3.3178
  [3,15,16.065,-.25,3.75,15.321,-.25,3.1875,15.7556,-.25,3.3178],
// 4 15 16.065 -.25 3.75 -8.8275 -.25 3.75 -8.9681 -.25 3.1875 15.321 -.25 3.1875
  [4,15,16.065,-.25,3.75,-8.8275,-.25,3.75,-8.9681,-.25,3.1875,15.321,-.25,3.1875],
// 4 15 -10.6974 -.25 3.6473 -10.2147 -.25 3.119 -8.9681 -.25 3.1875 -8.8275 -.25 3.75
  [4,15,-10.6974,-.25,3.6473,-10.2147,-.25,3.119,-8.9681,-.25,3.1875,-8.8275,-.25,3.75],
// 4 15 -10.6974 -.25 3.6473 -12.4058 -.25 3.3546 -11.3537 -.25 2.9239 -10.2147 -.25 3.119
  [4,15,-10.6974,-.25,3.6473,-12.4058,-.25,3.3546,-11.3537,-.25,2.9239,-10.2147,-.25,3.119],
// 4 15 -13.693 -.25 2.9167 -12.2117 -.25 2.6319 -11.3537 -.25 2.9239 -12.4058 -.25 3.3546
  [4,15,-13.693,-.25,2.9167,-12.2117,-.25,2.6319,-11.3537,-.25,2.9239,-12.4058,-.25,3.3546],
// 4 15 -13.693 -.25 2.9167 -14.3625 -.25 2.4 -12.6581 -.25 2.2875 -12.2117 -.25 2.6319
  [4,15,-13.693,-.25,2.9167,-14.3625,-.25,2.4,-12.6581,-.25,2.2875,-12.2117,-.25,2.6319],
// 4 15 -16.5 -.25 -1.1625 -14.7956 -.25 -1.275 -12.6581 -.25 2.2875 -14.3625 -.25 2.4
  [4,15,-16.5,-.25,-1.1625,-14.7956,-.25,-1.275,-12.6581,-.25,2.2875,-14.3625,-.25,2.4],
// 4 15 -16.5 -.25 -1.1625 -16.4422 -.25 -1.7653 -14.7626 -.25 -1.6194 -14.7956 -.25 -1.275
  [4,15,-16.5,-.25,-1.1625,-16.4422,-.25,-1.7653,-14.7626,-.25,-1.6194,-14.7956,-.25,-1.275],
// 4 15 -15.5536 -.25 -2.2762 -14.2548 -.25 -1.9114 -14.7626 -.25 -1.6194 -16.4422 -.25 -1.7653
  [4,15,-15.5536,-.25,-2.2762,-14.2548,-.25,-1.9114,-14.7626,-.25,-1.6194,-16.4422,-.25,-1.7653],
// 4 15 -15.5536 -.25 -2.2762 -13.9703 -.25 -2.6177 -13.35 -.25 -2.1065 -14.2548 -.25 -1.9114
  [4,15,-15.5536,-.25,-2.2762,-13.9703,-.25,-2.6177,-13.35,-.25,-2.1065,-14.2548,-.25,-1.9114],
// 4 15 -11.9325 -.25 -2.7375 -12.1856 -.25 -2.175 -13.35 -.25 -2.1065 -13.9703 -.25 -2.6177
  [4,15,-11.9325,-.25,-2.7375,-12.1856,-.25,-2.175,-13.35,-.25,-2.1065,-13.9703,-.25,-2.6177],
// 4 15 -11.9325 -.25 -2.7375 -5.28 -.25 -2.7375 -5.9269 -.25 -2.175 -12.1856 -.25 -2.175
  [4,15,-11.9325,-.25,-2.7375,-5.28,-.25,-2.7375,-5.9269,-.25,-2.175,-12.1856,-.25,-2.175],
// 4 15 -4.3451 -.25 -2.6861 -5.3036 -.25 -2.1407 -5.9269 -.25 -2.175 -5.28 -.25 -2.7375
  [4,15,-4.3451,-.25,-2.6861,-5.3036,-.25,-2.1407,-5.9269,-.25,-2.175,-5.28,-.25,-2.7375],
// 4 15 -4.3451 -.25 -2.6861 -3.4909 -.25 -2.5398 -4.7341 -.25 -2.0432 -5.3036 -.25 -2.1407
  [4,15,-4.3451,-.25,-2.6861,-3.4909,-.25,-2.5398,-4.7341,-.25,-2.0432,-5.3036,-.25,-2.1407],
// 4 15 -2.8473 -.25 -2.3208 -4.3051 -.25 -1.8972 -4.7341 -.25 -2.0432 -3.4909 -.25 -2.5398
  [4,15,-2.8473,-.25,-2.3208,-4.3051,-.25,-1.8972,-4.7341,-.25,-2.0432,-3.4909,-.25,-2.5398],
// 4 15 -2.8473 -.25 -2.3208 -2.5125 -.25 -2.0625 -4.0819 -.25 -1.725 -4.3051 -.25 -1.8972
  [4,15,-2.8473,-.25,-2.3208,-2.5125,-.25,-2.0625,-4.0819,-.25,-1.725,-4.3051,-.25,-1.8972],
// 4 15 -.7913 -.25 .8063 -2.7656 -.25 .4688 -4.0819 -.25 -1.725 -2.5125 -.25 -2.0625
  [4,15,-.7913,-.25,.8063,-2.7656,-.25,.4688,-4.0819,-.25,-1.725,-2.5125,-.25,-2.0625],
// 4 15 -.7913 -.25 .8063 -.8078 -.25 .9785 -2.7739 -.25 .5549 -2.7656 -.25 .4688
  [4,15,-.7913,-.25,.8063,-.8078,-.25,.9785,-2.7739,-.25,.5549,-2.7656,-.25,.4688],
// 4 15 -1.0616 -.25 1.1245 -2.9009 -.25 .6278 -2.7739 -.25 .5549 -.8078 -.25 .9785
  [4,15,-1.0616,-.25,1.1245,-2.9009,-.25,.6278,-2.7739,-.25,.5549,-.8078,-.25,.9785],
// 4 15 -1.0616 -.25 1.1245 -1.514 -.25 1.222 -3.1271 -.25 .6767 -2.9009 -.25 .6278
  [4,15,-1.0616,-.25,1.1245,-1.514,-.25,1.222,-3.1271,-.25,.6767,-2.9009,-.25,.6278],
// 4 15 -2.0963 -.25 1.2563 -3.4181 -.25 .6938 -3.1271 -.25 .6767 -1.514 -.25 1.222
  [4,15,-2.0963,-.25,1.2563,-3.4181,-.25,.6938,-3.1271,-.25,.6767,-1.514,-.25,1.222],
// 4 15 -2.0963 -.25 1.2563 -8.6963 -.25 1.2123 -9.1613 -.25 .6938 -3.4181 -.25 .6938
  [4,15,-2.0963,-.25,1.2563,-8.6963,-.25,1.2123,-9.1613,-.25,.6938,-3.4181,-.25,.6938],
// 4 15 -2.0963 -.25 1.2563 -8.2988 -.25 1.2563 -8.5065 -.25 1.2449 -8.6963 -.25 1.2123
  [4,15,-2.0963,-.25,1.2563,-8.2988,-.25,1.2563,-8.5065,-.25,1.2449,-8.6963,-.25,1.2123],
// 4 15 -9.1613 -.25 .6938 -8.6963 -.25 1.2123 -8.8394 -.25 1.1636 -8.9138 -.25 1.1063
  [4,15,-9.1613,-.25,.6938,-8.6963,-.25,1.2123,-8.8394,-.25,1.1636,-8.9138,-.25,1.1063],
// 4 15 12.1178 -.25 2.2973 12.4222 -.25 2.3495 12.6803 -.25 2.4113 14.08 -.25 2.8125
  [4,15,12.1178,-.25,2.2973,12.4222,-.25,2.3495,12.6803,-.25,2.4113,14.08,-.25,2.8125],
// 4 15 12.1178 -.25 2.2973 14.08 -.25 2.8125 7.1531 -.25 2.8125 8.5875 -.25 2.25
  [4,15,12.1178,-.25,2.2973,14.08,-.25,2.8125,7.1531,-.25,2.8125,8.5875,-.25,2.25],
// 4 15 12.1178 -.25 2.2973 8.5875 -.25 2.25 11.5553 -.25 2.25 11.8133 -.25 2.2623
  [4,15,12.1178,-.25,2.2973,8.5875,-.25,2.25,11.5553,-.25,2.25,11.8133,-.25,2.2623],
// 4 15 8.2759 -.25 2.2329 8.5875 -.25 2.25 7.1531 -.25 2.8125 6.8415 -.25 2.7954
  [4,15,8.2759,-.25,2.2329,8.5875,-.25,2.25,7.1531,-.25,2.8125,6.8415,-.25,2.7954],
// 4 15 8.2759 -.25 2.2329 6.8415 -.25 2.7954 6.5567 -.25 2.7466 7.9911 -.25 2.1841
  [4,15,8.2759,-.25,2.2329,6.8415,-.25,2.7954,6.5567,-.25,2.7466,7.9911,-.25,2.1841],
// 4 15 7.7766 -.25 2.1111 7.9911 -.25 2.1841 6.5567 -.25 2.7466 6.3422 -.25 2.6736
  [4,15,7.7766,-.25,2.1111,7.9911,-.25,2.1841,6.5567,-.25,2.7466,6.3422,-.25,2.6736],
// 4 15 7.7766 -.25 2.1111 6.3422 -.25 2.6736 6.2306 -.25 2.5875 7.665 -.25 2.025
  [4,15,7.7766,-.25,2.1111,6.3422,-.25,2.6736,6.2306,-.25,2.5875,7.665,-.25,2.025],
// 4 15 5.0516 -.25 -2.1035 5.2465 -.25 -1.9469 5.3754 -.25 -1.7911 7.665 -.25 2.025
  [4,15,5.0516,-.25,-2.1035,5.2465,-.25,-1.9469,5.3754,-.25,-1.7911,7.665,-.25,2.025],
// 4 15 5.0516 -.25 -2.1035 7.665 -.25 2.025 6.2306 -.25 2.5875 3.0104 -.25 -2.7795
  [4,15,5.0516,-.25,-2.1035,7.665,-.25,2.025,6.2306,-.25,2.5875,3.0104,-.25,-2.7795],
// 4 15 5.0516 -.25 -2.1035 3.0104 -.25 -2.7795 4.5879 -.25 -2.3273 4.8203 -.25 -2.2371
  [4,15,5.0516,-.25,-2.1035,3.0104,-.25,-2.7795,4.5879,-.25,-2.3273,4.8203,-.25,-2.2371],
// 4 15 -.4591 -.25 -3.7403 -.4106 -.25 -3.75 -.3311 -.25 -3.7374 1.5838 -.25 -3.1885
  [4,15,-.4591,-.25,-3.7403,-.4106,-.25,-3.75,-.3311,-.25,-3.7374,1.5838,-.25,-3.1885],
// 4 15 -.4591 -.25 -3.7403 1.5838 -.25 -3.1885 5.0494 -.25 2.5875 2.805 -.25 1.8
  [4,15,-.4591,-.25,-3.7403,1.5838,-.25,-3.1885,5.0494,-.25,2.5875,2.805,-.25,1.8],
// 4 15 -.4591 -.25 -3.7403 2.805 -.25 1.8 -.4651 -.25 -3.6501 -.4823 -.25 -3.6965
  [4,15,-.4591,-.25,-3.7403,2.805,-.25,1.8,-.4651,-.25,-3.6501,-.4823,-.25,-3.6965],
// 4 15 2.7885 -.25 1.9722 2.805 -.25 1.8 5.0494 -.25 2.5875 5.0411 -.25 2.6736
  [4,15,2.7885,-.25,1.9722,2.805,-.25,1.8,5.0494,-.25,2.5875,5.0411,-.25,2.6736],
// 4 15 2.7885 -.25 1.9722 5.0411 -.25 2.6736 4.9142 -.25 2.7466 2.5346 -.25 2.1182
  [4,15,2.7885,-.25,1.9722,5.0411,-.25,2.6736,4.9142,-.25,2.7466,2.5346,-.25,2.1182],
// 4 15 2.0822 -.25 2.2157 2.5346 -.25 2.1182 4.9142 -.25 2.7466 4.688 -.25 2.7954
  [4,15,2.0822,-.25,2.2157,2.5346,-.25,2.1182,4.9142,-.25,2.7466,4.688,-.25,2.7954],
// 4 15 2.0822 -.25 2.2157 4.688 -.25 2.7954 4.3969 -.25 2.8125 1.5 -.25 2.25
  [4,15,2.0822,-.25,2.2157,4.688,-.25,2.7954,4.3969,-.25,2.8125,1.5,-.25,2.25],
// 4 15 -8.1525 -.25 2.25 1.5 -.25 2.25 4.3969 -.25 2.8125 -8.0119 -.25 2.8125
  [4,15,-8.1525,-.25,2.25,1.5,-.25,2.25,4.3969,-.25,2.8125,-8.0119,-.25,2.8125],
// 4 15 -8.1525 -.25 2.25 -8.0119 -.25 2.8125 -9.2585 -.25 2.744 -8.7758 -.25 2.2157
  [4,15,-8.1525,-.25,2.25,-8.0119,-.25,2.8125,-9.2585,-.25,2.744,-8.7758,-.25,2.2157],
// 4 15 -9.3453 -.25 2.1182 -8.7758 -.25 2.2157 -9.2585 -.25 2.744 -10.3974 -.25 2.5489
  [4,15,-9.3453,-.25,2.1182,-8.7758,-.25,2.2157,-9.2585,-.25,2.744,-10.3974,-.25,2.5489],
// 4 15 -9.3453 -.25 2.1182 -10.3974 -.25 2.5489 -11.2555 -.25 2.2569 -9.7743 -.25 1.9722
  [4,15,-9.3453,-.25,2.1182,-10.3974,-.25,2.5489,-11.2555,-.25,2.2569,-9.7743,-.25,1.9722],
// 4 15 -9.9975 -.25 1.8 -9.7743 -.25 1.9722 -11.2555 -.25 2.2569 -11.7019 -.25 1.9125
  [4,15,-9.9975,-.25,1.8,-9.7743,-.25,1.9722,-11.2555,-.25,2.2569,-11.7019,-.25,1.9125],
// 4 15 -9.9975 -.25 1.8 -11.7019 -.25 1.9125 -13.3894 -.25 -.9 -11.55 -.25 -.7875
  [4,15,-9.9975,-.25,1.8,-11.7019,-.25,1.9125,-13.3894,-.25,-.9,-11.55,-.25,-.7875],
// 4 15 -11.5335 -.25 -.9597 -11.55 -.25 -.7875 -13.3894 -.25 -.9 -13.3563 -.25 -1.2444
  [4,15,-11.5335,-.25,-.9597,-11.55,-.25,-.7875,-13.3894,-.25,-.9,-13.3563,-.25,-1.2444],
// 4 15 -11.5335 -.25 -.9597 -13.3563 -.25 -1.2444 -12.8486 -.25 -1.5364 -11.2796 -.25 -1.1057
  [4,15,-11.5335,-.25,-.9597,-13.3563,-.25,-1.2444,-12.8486,-.25,-1.5364,-11.2796,-.25,-1.1057],
// 4 15 -10.8272 -.25 -1.2032 -11.2796 -.25 -1.1057 -12.8486 -.25 -1.5364 -11.9438 -.25 -1.7315
  [4,15,-10.8272,-.25,-1.2032,-11.2796,-.25,-1.1057,-12.8486,-.25,-1.5364,-11.9438,-.25,-1.7315],
// 4 15 -10.8272 -.25 -1.2032 -11.9438 -.25 -1.7315 -10.7794 -.25 -1.8 -10.245 -.25 -1.2375
  [4,15,-10.8272,-.25,-1.2032,-11.9438,-.25,-1.7315,-10.7794,-.25,-1.8,-10.245,-.25,-1.2375],
// 4 15 -7.53 -.25 -1.2375 -10.245 -.25 -1.2375 -10.7794 -.25 -1.8 -6.8831 -.25 -1.8
  [4,15,-7.53,-.25,-1.2375,-10.245,-.25,-1.2375,-10.7794,-.25,-1.8,-6.8831,-.25,-1.8],
// 4 15 -7.53 -.25 -1.2375 -6.8831 -.25 -1.8 -6.2598 -.25 -1.7657 -7.2184 -.25 -1.2204
  [4,15,-7.53,-.25,-1.2375,-6.8831,-.25,-1.8,-6.2598,-.25,-1.7657,-7.2184,-.25,-1.2204],
// 4 15 -6.9336 -.25 -1.1716 -7.2184 -.25 -1.2204 -6.2598 -.25 -1.7657 -5.6903 -.25 -1.6682
  [4,15,-6.9336,-.25,-1.1716,-7.2184,-.25,-1.2204,-6.2598,-.25,-1.7657,-5.6903,-.25,-1.6682],
// 4 15 -6.9336 -.25 -1.1716 -5.6903 -.25 -1.6682 -5.2613 -.25 -1.5222 -6.7191 -.25 -1.0986
  [4,15,-6.9336,-.25,-1.1716,-5.6903,-.25,-1.6682,-5.2613,-.25,-1.5222,-6.7191,-.25,-1.0986],
// 4 15 -6.6075 -.25 -1.0125 -6.7191 -.25 -1.0986 -5.2613 -.25 -1.5222 -5.0381 -.25 -1.35
  [4,15,-6.6075,-.25,-1.0125,-6.7191,-.25,-1.0986,-5.2613,-.25,-1.5222,-5.0381,-.25,-1.35],
// 4 15 -6.6075 -.25 -1.0125 -5.0381 -.25 -1.35 -4.1719 -.25 .0938 -6.2363 -.25 -.3938
  [4,15,-6.6075,-.25,-1.0125,-5.0381,-.25,-1.35,-4.1719,-.25,.0938,-6.2363,-.25,-.3938],
// 4 15 -6.2417 -.25 -.3364 -6.2363 -.25 -.3938 -4.1719 -.25 .0938 -4.1801 -.25 .1799
  [4,15,-6.2417,-.25,-.3364,-6.2363,-.25,-.3938,-4.1719,-.25,.0938,-4.1801,-.25,.1799],
// 4 15 -6.2417 -.25 -.3364 -4.1801 -.25 .1799 -4.3071 -.25 .2528 -6.3264 -.25 -.2877
  [4,15,-6.2417,-.25,-.3364,-4.1801,-.25,.1799,-4.3071,-.25,.2528,-6.3264,-.25,-.2877],
// 4 15 -6.4772 -.25 -.2552 -6.3264 -.25 -.2877 -4.3071 -.25 .2528 -4.5333 -.25 .3017
  [4,15,-6.4772,-.25,-.2552,-6.3264,-.25,-.2877,-4.3071,-.25,.2528,-4.5333,-.25,.3017],
// 4 15 -6.4772 -.25 -.2552 -4.5333 -.25 .3017 -4.8244 -.25 .3188 -6.6713 -.25 -.2438
  [4,15,-6.4772,-.25,-.2552,-4.5333,-.25,.3017,-4.8244,-.25,.3188,-6.6713,-.25,-.2438],
// 4 15 -9.5436 -.25 -.1998 -9.3929 -.25 -.2324 -9.1988 -.25 -.2438 -6.6713 -.25 -.2438
  [4,15,-9.5436,-.25,-.1998,-9.3929,-.25,-.2324,-9.1988,-.25,-.2438,-6.6713,-.25,-.2438],
// 4 15 -9.5436 -.25 -.1998 -6.6713 -.25 -.2438 -4.8244 -.25 .3188 -9.3863 -.25 .3188
  [4,15,-9.5436,-.25,-.1998,-6.6713,-.25,-.2438,-4.8244,-.25,.3188,-9.3863,-.25,.3188],
// 4 15 -9.5436 -.25 -.1998 -9.3863 -.25 .3188 -9.6338 -.25 -.0938 -9.6283 -.25 -.1511
  [4,15,-9.5436,-.25,-.1998,-9.3863,-.25,.3188,-9.6338,-.25,-.0938,-9.6283,-.25,-.1511],
];
module ldraw_lib__6177969s(step=0, col=false, unit=2/5, alt=false, line=0.2, solid=!$preview)
    makepoly(ldraw_lib__6177969s(), step=step, col=col, unit=unit, alt=alt, line=line, solid=solid);
ldraw_lib__6177969s(line=0.2);
